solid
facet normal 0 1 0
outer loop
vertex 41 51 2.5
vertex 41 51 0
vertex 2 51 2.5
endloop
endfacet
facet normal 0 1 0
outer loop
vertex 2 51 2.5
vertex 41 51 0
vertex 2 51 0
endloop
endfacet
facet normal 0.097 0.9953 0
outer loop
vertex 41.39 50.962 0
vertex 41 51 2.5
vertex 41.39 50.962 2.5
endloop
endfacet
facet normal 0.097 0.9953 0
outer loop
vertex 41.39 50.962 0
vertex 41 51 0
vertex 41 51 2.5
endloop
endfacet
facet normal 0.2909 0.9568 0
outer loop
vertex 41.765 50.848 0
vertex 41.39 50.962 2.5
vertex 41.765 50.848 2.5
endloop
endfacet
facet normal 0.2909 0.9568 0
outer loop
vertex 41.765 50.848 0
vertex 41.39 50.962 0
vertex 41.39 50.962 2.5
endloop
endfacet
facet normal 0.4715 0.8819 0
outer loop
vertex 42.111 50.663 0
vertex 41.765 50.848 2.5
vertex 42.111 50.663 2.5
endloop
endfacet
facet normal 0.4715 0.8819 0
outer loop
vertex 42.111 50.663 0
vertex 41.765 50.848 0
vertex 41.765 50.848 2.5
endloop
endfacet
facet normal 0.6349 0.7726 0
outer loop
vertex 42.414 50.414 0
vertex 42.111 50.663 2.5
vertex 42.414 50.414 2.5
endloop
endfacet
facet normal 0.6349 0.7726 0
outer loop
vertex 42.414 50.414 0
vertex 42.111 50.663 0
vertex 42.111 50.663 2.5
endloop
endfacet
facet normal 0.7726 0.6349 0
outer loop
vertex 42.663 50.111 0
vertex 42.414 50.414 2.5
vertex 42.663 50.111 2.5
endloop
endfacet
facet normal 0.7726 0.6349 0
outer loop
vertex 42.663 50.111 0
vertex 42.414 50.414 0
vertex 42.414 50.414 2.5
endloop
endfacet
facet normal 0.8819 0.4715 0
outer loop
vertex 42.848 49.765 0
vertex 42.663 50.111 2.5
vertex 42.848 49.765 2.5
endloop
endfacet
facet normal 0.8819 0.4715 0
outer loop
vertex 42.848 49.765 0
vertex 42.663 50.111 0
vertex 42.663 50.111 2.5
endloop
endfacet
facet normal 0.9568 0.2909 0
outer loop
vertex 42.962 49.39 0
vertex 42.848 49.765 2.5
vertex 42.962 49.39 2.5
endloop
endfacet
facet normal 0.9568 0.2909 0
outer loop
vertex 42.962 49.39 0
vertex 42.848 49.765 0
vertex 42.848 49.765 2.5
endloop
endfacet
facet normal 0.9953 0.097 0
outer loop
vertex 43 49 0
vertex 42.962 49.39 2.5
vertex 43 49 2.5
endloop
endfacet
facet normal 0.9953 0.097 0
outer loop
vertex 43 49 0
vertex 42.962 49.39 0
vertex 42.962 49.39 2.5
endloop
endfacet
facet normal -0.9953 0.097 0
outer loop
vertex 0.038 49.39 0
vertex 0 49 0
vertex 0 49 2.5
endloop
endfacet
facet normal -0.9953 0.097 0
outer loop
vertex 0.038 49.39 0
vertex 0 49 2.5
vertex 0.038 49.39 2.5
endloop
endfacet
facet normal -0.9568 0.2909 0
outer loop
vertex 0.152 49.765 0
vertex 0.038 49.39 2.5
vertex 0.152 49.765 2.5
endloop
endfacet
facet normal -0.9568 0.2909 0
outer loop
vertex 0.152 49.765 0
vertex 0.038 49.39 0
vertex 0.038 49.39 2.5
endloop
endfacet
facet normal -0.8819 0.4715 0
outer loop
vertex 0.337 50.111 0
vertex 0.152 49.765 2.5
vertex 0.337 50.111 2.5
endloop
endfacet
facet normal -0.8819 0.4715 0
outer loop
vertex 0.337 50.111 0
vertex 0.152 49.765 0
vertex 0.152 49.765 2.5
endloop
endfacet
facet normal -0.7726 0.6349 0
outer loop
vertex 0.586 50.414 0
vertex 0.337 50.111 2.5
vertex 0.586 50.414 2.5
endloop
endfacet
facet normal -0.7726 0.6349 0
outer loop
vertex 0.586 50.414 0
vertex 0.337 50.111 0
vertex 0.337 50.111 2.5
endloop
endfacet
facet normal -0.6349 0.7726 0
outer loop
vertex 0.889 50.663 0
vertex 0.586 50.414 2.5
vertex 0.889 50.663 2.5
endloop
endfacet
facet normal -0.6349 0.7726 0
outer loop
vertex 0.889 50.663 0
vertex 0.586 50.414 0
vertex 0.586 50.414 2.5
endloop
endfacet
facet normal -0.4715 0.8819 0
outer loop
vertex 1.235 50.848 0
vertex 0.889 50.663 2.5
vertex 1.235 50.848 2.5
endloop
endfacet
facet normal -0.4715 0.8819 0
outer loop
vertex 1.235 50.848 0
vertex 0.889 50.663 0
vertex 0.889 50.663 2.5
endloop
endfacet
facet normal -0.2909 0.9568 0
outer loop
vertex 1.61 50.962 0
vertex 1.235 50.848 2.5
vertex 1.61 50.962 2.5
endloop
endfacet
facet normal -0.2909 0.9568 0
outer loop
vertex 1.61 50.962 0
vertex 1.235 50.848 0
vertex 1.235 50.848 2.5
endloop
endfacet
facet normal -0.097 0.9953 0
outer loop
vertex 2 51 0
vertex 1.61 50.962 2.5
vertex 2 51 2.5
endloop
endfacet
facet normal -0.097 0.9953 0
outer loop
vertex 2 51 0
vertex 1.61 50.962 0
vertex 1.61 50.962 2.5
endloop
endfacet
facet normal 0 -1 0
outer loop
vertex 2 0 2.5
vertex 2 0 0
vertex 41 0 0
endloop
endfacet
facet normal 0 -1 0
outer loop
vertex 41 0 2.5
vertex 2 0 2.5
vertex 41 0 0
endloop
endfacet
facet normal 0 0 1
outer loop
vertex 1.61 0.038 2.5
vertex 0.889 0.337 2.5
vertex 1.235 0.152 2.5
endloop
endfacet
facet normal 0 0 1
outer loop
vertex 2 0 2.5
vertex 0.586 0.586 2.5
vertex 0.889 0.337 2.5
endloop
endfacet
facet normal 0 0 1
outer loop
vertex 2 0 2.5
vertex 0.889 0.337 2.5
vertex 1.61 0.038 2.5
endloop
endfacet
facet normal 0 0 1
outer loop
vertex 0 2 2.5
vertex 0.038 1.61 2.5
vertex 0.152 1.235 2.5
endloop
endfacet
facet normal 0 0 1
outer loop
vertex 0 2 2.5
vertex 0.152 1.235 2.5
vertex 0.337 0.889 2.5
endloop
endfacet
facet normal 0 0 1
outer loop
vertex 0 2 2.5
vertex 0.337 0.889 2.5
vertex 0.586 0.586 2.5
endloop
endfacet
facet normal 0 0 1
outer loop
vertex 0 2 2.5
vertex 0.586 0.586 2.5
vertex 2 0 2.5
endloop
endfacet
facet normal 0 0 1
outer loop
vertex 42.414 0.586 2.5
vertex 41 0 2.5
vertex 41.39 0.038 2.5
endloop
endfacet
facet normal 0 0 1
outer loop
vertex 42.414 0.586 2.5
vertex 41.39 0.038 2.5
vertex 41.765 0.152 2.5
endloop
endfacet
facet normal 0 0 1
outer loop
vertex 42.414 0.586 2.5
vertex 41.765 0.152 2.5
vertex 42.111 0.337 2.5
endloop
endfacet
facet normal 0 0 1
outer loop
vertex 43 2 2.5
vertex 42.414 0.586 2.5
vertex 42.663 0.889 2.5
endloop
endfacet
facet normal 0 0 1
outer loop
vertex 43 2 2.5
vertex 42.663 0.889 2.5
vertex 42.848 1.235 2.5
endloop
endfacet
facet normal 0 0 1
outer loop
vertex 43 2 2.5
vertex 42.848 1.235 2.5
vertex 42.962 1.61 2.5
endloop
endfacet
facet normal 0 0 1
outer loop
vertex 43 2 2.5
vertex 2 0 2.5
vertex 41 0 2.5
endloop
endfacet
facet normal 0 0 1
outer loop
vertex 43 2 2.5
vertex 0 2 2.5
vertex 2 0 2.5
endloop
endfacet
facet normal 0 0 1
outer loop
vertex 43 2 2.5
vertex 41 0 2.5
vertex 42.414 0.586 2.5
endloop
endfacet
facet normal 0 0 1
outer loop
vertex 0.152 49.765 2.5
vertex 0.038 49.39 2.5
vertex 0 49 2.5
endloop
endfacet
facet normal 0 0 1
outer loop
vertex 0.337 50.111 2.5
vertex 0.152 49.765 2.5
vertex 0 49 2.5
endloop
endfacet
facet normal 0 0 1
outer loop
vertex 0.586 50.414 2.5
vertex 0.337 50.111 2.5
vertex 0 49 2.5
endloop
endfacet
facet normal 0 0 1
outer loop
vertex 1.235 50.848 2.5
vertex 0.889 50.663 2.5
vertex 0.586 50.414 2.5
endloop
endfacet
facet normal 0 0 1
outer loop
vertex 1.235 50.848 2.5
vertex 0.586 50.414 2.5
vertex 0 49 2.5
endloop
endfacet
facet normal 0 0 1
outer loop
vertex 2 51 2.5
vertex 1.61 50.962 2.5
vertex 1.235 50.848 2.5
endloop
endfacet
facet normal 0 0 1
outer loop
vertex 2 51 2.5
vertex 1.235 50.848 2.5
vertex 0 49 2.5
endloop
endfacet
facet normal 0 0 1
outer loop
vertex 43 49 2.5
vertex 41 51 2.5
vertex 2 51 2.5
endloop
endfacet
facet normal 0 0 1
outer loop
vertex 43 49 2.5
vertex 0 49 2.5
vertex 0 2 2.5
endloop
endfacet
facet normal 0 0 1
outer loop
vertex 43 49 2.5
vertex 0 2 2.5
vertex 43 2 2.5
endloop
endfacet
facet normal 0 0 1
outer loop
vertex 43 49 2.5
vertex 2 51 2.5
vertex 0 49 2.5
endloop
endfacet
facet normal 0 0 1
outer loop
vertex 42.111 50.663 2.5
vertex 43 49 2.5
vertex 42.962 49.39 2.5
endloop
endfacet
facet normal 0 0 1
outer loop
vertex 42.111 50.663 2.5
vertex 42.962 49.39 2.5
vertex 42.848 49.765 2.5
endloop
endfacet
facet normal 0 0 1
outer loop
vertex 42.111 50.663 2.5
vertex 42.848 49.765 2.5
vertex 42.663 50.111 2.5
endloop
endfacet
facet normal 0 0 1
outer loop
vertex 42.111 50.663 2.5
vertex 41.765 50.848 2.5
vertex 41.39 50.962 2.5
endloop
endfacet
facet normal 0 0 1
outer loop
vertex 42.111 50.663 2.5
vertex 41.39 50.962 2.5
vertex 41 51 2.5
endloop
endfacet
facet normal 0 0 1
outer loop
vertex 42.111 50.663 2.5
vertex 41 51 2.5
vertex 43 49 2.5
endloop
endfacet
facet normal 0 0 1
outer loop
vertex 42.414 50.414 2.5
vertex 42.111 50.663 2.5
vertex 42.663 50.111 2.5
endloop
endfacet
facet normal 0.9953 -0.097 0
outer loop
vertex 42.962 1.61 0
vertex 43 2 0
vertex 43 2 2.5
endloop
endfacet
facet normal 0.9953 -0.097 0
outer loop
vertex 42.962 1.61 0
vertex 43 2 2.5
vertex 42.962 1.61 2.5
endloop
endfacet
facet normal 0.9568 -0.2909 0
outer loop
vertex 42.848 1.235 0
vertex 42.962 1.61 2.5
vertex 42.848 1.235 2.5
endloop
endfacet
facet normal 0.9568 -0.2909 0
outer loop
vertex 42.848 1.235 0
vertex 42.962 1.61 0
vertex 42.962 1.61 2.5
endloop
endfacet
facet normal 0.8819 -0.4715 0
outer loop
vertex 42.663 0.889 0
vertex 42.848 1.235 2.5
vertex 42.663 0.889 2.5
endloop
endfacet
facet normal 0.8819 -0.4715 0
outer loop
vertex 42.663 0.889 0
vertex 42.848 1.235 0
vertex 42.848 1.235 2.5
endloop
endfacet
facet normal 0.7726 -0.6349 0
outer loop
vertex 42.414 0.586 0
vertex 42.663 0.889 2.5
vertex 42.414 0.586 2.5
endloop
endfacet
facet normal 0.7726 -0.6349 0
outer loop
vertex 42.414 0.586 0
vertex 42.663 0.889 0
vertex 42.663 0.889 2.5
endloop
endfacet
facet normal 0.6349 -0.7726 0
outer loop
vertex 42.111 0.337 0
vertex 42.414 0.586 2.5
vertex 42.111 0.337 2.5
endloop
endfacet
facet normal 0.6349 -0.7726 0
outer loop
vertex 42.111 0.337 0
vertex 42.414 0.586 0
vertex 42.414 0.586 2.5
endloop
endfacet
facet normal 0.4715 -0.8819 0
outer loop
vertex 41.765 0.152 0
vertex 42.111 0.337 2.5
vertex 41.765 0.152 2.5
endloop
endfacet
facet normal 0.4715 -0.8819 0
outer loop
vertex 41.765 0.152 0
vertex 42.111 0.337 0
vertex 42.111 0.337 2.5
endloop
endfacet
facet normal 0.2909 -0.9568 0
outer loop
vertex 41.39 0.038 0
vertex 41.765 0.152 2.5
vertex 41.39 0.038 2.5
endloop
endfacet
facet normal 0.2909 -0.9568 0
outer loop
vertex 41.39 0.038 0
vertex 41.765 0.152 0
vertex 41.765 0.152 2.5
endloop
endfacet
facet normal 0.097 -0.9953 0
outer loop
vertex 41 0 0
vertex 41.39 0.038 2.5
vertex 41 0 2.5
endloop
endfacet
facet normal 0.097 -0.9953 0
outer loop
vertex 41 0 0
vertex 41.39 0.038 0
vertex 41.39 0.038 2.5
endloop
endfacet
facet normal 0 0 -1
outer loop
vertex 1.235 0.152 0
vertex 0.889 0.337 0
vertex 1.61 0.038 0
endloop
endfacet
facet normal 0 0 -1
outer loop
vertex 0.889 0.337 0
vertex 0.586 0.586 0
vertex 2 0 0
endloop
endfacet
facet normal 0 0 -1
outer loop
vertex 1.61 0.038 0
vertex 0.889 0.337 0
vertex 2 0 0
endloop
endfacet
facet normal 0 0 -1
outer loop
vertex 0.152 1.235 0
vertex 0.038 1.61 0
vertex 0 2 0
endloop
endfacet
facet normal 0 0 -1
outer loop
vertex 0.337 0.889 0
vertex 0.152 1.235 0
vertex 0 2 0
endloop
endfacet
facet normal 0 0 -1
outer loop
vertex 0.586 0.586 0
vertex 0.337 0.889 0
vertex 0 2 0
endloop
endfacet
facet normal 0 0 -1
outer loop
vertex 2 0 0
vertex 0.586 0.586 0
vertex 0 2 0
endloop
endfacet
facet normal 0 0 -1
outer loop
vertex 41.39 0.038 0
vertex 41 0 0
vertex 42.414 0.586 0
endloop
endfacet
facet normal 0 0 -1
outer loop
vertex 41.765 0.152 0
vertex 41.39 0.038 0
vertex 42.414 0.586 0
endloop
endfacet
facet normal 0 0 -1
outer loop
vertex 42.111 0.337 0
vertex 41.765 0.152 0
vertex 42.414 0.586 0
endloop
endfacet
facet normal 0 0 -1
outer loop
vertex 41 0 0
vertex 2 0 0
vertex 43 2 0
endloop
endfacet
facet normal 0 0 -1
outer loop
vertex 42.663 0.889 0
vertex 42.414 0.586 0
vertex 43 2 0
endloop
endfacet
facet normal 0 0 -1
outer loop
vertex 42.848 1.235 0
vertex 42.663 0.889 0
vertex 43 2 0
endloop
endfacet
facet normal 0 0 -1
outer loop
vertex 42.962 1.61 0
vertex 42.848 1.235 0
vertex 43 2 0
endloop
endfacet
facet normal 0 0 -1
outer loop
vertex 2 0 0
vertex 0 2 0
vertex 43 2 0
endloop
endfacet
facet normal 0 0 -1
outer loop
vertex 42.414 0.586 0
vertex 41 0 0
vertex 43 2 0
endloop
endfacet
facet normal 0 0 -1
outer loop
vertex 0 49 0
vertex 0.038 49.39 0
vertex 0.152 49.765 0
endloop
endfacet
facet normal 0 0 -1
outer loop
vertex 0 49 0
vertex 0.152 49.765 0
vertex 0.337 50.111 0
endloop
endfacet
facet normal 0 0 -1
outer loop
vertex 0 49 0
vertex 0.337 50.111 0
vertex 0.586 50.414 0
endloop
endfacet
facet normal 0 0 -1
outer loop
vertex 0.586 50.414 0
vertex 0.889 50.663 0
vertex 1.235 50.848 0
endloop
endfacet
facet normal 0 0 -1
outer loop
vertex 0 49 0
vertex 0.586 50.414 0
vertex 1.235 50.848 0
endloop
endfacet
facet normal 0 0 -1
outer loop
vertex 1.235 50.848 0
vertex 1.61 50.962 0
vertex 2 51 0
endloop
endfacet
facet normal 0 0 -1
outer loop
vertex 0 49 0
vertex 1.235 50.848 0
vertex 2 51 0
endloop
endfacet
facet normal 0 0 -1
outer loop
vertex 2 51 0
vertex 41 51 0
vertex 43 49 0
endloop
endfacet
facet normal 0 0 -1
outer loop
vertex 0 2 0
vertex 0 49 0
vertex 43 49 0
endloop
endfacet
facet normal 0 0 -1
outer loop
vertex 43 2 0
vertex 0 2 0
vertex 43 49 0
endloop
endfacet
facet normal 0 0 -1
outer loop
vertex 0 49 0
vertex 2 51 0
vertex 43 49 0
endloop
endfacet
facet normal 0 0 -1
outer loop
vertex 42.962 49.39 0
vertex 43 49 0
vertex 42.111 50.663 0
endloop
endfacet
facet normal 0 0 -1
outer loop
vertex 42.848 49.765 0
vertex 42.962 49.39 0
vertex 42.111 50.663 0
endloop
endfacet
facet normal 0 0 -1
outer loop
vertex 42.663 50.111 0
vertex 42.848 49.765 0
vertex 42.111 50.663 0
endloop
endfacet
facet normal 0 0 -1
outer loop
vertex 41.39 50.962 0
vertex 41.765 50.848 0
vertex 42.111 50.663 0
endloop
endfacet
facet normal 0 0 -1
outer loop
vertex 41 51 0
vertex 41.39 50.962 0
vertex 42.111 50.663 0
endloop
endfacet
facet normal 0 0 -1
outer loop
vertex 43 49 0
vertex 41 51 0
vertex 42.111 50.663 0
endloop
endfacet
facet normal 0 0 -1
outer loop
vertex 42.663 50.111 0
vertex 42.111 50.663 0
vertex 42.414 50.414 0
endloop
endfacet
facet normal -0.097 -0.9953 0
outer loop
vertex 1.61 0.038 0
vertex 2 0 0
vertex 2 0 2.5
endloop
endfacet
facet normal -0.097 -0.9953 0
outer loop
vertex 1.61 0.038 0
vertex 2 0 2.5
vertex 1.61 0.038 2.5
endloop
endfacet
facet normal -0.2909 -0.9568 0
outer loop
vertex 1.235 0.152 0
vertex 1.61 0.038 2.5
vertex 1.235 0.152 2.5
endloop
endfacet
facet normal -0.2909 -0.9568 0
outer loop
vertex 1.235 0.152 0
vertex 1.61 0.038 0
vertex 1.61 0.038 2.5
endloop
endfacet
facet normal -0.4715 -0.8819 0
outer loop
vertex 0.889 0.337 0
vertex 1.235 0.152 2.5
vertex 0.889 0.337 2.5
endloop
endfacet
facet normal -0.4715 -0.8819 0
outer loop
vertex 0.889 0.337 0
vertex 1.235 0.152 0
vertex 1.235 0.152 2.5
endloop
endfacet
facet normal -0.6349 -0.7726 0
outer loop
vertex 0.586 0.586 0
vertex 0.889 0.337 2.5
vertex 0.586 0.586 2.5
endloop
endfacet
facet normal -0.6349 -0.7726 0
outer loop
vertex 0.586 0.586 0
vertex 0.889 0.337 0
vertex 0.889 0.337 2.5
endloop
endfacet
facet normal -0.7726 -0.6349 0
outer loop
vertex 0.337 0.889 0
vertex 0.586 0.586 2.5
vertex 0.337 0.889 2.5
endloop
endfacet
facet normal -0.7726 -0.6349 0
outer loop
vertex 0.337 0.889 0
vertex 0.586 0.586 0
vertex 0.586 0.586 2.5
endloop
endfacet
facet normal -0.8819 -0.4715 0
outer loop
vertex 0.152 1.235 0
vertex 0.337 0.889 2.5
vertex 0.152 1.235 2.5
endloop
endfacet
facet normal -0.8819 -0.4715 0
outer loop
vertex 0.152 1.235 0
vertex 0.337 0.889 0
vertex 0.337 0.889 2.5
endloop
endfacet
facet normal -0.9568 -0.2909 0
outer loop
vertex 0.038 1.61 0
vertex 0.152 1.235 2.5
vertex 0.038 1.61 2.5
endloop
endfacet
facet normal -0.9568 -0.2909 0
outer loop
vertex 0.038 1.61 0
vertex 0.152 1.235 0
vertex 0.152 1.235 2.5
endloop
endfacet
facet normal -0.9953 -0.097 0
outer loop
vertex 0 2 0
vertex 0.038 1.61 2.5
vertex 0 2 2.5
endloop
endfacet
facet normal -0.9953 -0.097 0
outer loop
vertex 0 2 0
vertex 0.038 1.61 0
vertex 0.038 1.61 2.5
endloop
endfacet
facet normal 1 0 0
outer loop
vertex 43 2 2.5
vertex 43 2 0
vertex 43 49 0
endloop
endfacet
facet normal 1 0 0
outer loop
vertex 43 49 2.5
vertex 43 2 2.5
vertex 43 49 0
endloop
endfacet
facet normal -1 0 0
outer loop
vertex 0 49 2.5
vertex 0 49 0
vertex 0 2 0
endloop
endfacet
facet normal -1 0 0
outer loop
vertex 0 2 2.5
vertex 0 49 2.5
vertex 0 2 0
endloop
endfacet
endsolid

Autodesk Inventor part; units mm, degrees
ref_plane "YZ Plane" through (0, 0, 0) normal (1, 0, 0) x (0, 1, 0)
ref_plane "XZ Plane" through (0, 0, 0) normal (0, 1, 0) x (-1, 0, 0)
ref_plane "XY Plane" through (0, 0, 0) normal (0, 0, 1) x (1, 0, 0)
sketch "Sketch1" plane through (0, 0, 0) normal (0, 0, 1) x (1, 0, 0)
  line L0 (2, 0) -> (41, 0)
  line L1 (43, 2) -> (43, 49)
  line L2 (41, 51) -> (2, 51)
  line L3 (0, 49) -> (0, 2)
  arc A0 (2, 51) -> (0, 49) centre (2, 49) ccw
  arc A1 (0, 2) -> (2, 0) centre (2, 2) ccw
  arc A2 (41, 0) -> (43, 2) centre (41, 2) ccw
  arc A3 (43, 49) -> (41, 51) centre (41, 49) ccw
  point P0 (0, 0)
  point P1 (43, 51)
  point P2 (43, 0)
  dimension "d0" = 43
  dimension "d1" = 51
  dimension "d2" = 2
  dimension "d3" = 2
extrude "Extrusion1" add sketch "Sketch1" along normal blind 2.5
properties part number "PerfBoard"
